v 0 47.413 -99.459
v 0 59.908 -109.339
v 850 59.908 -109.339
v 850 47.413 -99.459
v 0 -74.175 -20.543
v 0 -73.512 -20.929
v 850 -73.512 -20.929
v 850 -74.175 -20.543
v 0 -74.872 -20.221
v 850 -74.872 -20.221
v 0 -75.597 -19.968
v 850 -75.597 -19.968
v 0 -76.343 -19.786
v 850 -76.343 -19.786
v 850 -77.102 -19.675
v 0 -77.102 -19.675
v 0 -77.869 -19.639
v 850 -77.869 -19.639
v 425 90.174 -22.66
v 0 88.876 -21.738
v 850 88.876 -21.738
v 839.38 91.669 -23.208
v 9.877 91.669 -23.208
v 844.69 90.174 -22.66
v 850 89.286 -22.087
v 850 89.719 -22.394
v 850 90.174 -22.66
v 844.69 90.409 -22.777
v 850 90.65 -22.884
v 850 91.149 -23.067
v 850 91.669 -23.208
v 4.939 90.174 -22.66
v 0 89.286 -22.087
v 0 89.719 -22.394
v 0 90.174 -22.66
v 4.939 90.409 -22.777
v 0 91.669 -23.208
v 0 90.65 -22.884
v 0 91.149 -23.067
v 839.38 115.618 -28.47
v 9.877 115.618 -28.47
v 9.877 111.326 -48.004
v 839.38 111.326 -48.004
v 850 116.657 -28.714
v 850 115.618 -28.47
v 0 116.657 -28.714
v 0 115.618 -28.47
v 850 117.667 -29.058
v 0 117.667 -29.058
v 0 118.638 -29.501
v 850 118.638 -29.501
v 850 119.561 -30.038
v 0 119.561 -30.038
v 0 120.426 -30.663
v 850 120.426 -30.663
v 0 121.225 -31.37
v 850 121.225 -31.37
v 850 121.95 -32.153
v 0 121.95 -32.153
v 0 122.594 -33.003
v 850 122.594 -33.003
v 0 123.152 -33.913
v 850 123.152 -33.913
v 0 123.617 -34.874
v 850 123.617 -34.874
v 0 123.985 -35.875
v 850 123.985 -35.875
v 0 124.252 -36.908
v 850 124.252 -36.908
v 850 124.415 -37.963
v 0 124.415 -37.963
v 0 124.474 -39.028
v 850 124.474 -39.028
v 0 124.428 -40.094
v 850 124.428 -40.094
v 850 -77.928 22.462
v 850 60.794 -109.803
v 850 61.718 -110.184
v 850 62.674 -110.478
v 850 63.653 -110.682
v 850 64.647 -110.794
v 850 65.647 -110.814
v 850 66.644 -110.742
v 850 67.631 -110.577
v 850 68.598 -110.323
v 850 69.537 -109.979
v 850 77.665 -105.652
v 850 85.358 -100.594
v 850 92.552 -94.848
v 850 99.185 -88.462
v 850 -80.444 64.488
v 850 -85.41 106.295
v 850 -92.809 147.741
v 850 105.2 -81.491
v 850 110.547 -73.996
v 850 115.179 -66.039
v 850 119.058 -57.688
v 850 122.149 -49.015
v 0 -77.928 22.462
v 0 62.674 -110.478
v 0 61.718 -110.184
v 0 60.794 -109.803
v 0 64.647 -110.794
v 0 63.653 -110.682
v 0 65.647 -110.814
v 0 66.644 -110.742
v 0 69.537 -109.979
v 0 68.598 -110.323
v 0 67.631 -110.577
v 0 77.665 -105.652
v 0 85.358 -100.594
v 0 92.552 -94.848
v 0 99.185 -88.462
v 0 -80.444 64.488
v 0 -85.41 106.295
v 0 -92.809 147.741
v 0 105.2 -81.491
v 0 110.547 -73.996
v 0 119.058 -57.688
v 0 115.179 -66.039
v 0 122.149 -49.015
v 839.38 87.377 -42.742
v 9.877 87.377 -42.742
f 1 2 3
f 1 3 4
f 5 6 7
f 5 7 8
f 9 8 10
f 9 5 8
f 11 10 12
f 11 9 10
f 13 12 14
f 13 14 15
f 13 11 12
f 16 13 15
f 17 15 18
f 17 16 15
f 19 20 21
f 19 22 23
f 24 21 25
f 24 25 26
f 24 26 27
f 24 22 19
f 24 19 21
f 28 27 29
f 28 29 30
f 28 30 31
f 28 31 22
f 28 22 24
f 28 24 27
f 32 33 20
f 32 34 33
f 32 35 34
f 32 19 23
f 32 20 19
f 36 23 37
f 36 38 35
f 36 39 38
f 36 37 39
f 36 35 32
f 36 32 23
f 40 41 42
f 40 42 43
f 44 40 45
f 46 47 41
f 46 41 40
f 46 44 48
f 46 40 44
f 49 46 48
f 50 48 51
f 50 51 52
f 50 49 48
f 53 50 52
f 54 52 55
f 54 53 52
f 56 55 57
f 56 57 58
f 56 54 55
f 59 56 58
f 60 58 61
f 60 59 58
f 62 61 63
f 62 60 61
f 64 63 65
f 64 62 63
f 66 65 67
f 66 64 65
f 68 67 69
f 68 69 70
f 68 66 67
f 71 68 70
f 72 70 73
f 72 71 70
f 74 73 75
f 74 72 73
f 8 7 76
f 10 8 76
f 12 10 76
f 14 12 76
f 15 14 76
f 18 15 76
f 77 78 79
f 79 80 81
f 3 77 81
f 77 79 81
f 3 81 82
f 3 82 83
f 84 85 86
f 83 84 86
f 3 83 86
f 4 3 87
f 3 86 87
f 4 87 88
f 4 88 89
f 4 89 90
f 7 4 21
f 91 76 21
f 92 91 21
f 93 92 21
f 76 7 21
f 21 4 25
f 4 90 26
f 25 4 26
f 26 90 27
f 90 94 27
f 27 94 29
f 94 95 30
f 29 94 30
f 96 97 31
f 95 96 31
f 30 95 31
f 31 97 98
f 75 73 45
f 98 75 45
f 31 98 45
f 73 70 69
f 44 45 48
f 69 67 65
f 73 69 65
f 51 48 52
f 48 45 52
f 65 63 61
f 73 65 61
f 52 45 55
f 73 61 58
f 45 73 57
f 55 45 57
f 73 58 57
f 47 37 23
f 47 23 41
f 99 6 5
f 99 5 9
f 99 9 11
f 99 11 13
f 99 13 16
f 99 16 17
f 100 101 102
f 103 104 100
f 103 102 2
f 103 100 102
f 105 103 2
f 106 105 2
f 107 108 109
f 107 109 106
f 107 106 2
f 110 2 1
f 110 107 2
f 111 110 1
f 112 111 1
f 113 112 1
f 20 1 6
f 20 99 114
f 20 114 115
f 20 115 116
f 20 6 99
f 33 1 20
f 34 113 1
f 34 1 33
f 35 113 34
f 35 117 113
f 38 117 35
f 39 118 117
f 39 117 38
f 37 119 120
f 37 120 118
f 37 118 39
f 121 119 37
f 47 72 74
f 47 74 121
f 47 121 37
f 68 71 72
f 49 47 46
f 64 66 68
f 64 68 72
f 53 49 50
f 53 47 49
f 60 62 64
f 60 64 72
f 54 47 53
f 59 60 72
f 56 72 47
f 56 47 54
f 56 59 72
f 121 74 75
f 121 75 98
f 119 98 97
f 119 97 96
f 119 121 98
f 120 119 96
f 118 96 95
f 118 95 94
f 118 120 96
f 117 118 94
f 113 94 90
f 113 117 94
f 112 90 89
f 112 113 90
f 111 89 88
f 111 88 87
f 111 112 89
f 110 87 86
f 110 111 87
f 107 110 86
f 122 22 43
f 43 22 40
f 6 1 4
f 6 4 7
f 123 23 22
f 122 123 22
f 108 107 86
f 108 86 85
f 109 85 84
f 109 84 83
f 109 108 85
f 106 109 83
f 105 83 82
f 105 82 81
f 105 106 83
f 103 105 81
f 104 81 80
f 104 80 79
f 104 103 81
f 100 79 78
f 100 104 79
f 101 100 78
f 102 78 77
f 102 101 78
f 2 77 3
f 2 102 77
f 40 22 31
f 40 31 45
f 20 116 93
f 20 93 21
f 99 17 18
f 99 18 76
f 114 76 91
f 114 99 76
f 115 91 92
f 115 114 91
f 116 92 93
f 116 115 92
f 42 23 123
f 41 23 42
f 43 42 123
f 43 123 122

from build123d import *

# Parameters (mm, degrees)
BOSS_EXTRUDE1_DEPTH = 850
SKETCH2_W           = 829.503147771
SKETCH2_H           = 24.520289532
CUT_EXTRUDE1_DEPTH  = 20


with BuildPart() as part:
    # Sketch1 → Boss-Extrude1 (new body)
    with BuildSketch(Plane(origin=(0, 0, 0), x_dir=(0, 0, -1), z_dir=(1, 0, 0))):
        with BuildLine():
            Line((-147.74064655, -92.809040889), (21.737933493, 88.875862637))
            add(Edge.make_bspline(
                [(21.737933493, 88.875862637), (22.846353546, 90.074456327), (23.208127069, 91.669385546)],
                knots=[0, 0, 0, 1, 1, 1], degree=2))
            Line((23.208127069, 91.669385546), (28.470152179, 115.618408292))
            ThreePointArc((28.470152179, 115.618408292), (32.569812262, 122.282745924), (40.094456308, 124.427586441))
            ThreePointArc((40.094456308, 124.427586441), (81.491387891, 105.200191819), (109.979351041, 69.537401631))
            ThreePointArc((109.979351041, 69.537401631), (110.794083493, 64.647138854), (109.33864767, 59.907923142))
            Line((109.33864767, 59.907923142), (99.458915624, 47.413226279))
            Line((99.458915624, 47.413226279), (20.929242749, -73.511865602))
            ThreePointArc((20.929242749, -73.511865602), (19.968049413, -75.596855125), (19.638607292, -77.868977882))
            ThreePointArc((19.638607292, -77.868977882), (-64.487922257, -80.444221731), (-147.74064655, -92.809040889))
        make_face()
    extrude(amount=BOSS_EXTRUDE1_DEPTH)

    # Sketch2 → Cut-Extrude1 (cut)
    with BuildSketch(Plane(origin=(0, -0.642785482, -2.925505639), x_dir=(1, 0, 0), z_dir=(0, 0.21459881636528488, 0.9767022821794873))):
        with Locations((424.628691519, 106.774279434)):
            Rectangle(SKETCH2_W, SKETCH2_H)
    extrude(amount=-CUT_EXTRUDE1_DEPTH, mode=Mode.SUBTRACT)


solid = part.part
